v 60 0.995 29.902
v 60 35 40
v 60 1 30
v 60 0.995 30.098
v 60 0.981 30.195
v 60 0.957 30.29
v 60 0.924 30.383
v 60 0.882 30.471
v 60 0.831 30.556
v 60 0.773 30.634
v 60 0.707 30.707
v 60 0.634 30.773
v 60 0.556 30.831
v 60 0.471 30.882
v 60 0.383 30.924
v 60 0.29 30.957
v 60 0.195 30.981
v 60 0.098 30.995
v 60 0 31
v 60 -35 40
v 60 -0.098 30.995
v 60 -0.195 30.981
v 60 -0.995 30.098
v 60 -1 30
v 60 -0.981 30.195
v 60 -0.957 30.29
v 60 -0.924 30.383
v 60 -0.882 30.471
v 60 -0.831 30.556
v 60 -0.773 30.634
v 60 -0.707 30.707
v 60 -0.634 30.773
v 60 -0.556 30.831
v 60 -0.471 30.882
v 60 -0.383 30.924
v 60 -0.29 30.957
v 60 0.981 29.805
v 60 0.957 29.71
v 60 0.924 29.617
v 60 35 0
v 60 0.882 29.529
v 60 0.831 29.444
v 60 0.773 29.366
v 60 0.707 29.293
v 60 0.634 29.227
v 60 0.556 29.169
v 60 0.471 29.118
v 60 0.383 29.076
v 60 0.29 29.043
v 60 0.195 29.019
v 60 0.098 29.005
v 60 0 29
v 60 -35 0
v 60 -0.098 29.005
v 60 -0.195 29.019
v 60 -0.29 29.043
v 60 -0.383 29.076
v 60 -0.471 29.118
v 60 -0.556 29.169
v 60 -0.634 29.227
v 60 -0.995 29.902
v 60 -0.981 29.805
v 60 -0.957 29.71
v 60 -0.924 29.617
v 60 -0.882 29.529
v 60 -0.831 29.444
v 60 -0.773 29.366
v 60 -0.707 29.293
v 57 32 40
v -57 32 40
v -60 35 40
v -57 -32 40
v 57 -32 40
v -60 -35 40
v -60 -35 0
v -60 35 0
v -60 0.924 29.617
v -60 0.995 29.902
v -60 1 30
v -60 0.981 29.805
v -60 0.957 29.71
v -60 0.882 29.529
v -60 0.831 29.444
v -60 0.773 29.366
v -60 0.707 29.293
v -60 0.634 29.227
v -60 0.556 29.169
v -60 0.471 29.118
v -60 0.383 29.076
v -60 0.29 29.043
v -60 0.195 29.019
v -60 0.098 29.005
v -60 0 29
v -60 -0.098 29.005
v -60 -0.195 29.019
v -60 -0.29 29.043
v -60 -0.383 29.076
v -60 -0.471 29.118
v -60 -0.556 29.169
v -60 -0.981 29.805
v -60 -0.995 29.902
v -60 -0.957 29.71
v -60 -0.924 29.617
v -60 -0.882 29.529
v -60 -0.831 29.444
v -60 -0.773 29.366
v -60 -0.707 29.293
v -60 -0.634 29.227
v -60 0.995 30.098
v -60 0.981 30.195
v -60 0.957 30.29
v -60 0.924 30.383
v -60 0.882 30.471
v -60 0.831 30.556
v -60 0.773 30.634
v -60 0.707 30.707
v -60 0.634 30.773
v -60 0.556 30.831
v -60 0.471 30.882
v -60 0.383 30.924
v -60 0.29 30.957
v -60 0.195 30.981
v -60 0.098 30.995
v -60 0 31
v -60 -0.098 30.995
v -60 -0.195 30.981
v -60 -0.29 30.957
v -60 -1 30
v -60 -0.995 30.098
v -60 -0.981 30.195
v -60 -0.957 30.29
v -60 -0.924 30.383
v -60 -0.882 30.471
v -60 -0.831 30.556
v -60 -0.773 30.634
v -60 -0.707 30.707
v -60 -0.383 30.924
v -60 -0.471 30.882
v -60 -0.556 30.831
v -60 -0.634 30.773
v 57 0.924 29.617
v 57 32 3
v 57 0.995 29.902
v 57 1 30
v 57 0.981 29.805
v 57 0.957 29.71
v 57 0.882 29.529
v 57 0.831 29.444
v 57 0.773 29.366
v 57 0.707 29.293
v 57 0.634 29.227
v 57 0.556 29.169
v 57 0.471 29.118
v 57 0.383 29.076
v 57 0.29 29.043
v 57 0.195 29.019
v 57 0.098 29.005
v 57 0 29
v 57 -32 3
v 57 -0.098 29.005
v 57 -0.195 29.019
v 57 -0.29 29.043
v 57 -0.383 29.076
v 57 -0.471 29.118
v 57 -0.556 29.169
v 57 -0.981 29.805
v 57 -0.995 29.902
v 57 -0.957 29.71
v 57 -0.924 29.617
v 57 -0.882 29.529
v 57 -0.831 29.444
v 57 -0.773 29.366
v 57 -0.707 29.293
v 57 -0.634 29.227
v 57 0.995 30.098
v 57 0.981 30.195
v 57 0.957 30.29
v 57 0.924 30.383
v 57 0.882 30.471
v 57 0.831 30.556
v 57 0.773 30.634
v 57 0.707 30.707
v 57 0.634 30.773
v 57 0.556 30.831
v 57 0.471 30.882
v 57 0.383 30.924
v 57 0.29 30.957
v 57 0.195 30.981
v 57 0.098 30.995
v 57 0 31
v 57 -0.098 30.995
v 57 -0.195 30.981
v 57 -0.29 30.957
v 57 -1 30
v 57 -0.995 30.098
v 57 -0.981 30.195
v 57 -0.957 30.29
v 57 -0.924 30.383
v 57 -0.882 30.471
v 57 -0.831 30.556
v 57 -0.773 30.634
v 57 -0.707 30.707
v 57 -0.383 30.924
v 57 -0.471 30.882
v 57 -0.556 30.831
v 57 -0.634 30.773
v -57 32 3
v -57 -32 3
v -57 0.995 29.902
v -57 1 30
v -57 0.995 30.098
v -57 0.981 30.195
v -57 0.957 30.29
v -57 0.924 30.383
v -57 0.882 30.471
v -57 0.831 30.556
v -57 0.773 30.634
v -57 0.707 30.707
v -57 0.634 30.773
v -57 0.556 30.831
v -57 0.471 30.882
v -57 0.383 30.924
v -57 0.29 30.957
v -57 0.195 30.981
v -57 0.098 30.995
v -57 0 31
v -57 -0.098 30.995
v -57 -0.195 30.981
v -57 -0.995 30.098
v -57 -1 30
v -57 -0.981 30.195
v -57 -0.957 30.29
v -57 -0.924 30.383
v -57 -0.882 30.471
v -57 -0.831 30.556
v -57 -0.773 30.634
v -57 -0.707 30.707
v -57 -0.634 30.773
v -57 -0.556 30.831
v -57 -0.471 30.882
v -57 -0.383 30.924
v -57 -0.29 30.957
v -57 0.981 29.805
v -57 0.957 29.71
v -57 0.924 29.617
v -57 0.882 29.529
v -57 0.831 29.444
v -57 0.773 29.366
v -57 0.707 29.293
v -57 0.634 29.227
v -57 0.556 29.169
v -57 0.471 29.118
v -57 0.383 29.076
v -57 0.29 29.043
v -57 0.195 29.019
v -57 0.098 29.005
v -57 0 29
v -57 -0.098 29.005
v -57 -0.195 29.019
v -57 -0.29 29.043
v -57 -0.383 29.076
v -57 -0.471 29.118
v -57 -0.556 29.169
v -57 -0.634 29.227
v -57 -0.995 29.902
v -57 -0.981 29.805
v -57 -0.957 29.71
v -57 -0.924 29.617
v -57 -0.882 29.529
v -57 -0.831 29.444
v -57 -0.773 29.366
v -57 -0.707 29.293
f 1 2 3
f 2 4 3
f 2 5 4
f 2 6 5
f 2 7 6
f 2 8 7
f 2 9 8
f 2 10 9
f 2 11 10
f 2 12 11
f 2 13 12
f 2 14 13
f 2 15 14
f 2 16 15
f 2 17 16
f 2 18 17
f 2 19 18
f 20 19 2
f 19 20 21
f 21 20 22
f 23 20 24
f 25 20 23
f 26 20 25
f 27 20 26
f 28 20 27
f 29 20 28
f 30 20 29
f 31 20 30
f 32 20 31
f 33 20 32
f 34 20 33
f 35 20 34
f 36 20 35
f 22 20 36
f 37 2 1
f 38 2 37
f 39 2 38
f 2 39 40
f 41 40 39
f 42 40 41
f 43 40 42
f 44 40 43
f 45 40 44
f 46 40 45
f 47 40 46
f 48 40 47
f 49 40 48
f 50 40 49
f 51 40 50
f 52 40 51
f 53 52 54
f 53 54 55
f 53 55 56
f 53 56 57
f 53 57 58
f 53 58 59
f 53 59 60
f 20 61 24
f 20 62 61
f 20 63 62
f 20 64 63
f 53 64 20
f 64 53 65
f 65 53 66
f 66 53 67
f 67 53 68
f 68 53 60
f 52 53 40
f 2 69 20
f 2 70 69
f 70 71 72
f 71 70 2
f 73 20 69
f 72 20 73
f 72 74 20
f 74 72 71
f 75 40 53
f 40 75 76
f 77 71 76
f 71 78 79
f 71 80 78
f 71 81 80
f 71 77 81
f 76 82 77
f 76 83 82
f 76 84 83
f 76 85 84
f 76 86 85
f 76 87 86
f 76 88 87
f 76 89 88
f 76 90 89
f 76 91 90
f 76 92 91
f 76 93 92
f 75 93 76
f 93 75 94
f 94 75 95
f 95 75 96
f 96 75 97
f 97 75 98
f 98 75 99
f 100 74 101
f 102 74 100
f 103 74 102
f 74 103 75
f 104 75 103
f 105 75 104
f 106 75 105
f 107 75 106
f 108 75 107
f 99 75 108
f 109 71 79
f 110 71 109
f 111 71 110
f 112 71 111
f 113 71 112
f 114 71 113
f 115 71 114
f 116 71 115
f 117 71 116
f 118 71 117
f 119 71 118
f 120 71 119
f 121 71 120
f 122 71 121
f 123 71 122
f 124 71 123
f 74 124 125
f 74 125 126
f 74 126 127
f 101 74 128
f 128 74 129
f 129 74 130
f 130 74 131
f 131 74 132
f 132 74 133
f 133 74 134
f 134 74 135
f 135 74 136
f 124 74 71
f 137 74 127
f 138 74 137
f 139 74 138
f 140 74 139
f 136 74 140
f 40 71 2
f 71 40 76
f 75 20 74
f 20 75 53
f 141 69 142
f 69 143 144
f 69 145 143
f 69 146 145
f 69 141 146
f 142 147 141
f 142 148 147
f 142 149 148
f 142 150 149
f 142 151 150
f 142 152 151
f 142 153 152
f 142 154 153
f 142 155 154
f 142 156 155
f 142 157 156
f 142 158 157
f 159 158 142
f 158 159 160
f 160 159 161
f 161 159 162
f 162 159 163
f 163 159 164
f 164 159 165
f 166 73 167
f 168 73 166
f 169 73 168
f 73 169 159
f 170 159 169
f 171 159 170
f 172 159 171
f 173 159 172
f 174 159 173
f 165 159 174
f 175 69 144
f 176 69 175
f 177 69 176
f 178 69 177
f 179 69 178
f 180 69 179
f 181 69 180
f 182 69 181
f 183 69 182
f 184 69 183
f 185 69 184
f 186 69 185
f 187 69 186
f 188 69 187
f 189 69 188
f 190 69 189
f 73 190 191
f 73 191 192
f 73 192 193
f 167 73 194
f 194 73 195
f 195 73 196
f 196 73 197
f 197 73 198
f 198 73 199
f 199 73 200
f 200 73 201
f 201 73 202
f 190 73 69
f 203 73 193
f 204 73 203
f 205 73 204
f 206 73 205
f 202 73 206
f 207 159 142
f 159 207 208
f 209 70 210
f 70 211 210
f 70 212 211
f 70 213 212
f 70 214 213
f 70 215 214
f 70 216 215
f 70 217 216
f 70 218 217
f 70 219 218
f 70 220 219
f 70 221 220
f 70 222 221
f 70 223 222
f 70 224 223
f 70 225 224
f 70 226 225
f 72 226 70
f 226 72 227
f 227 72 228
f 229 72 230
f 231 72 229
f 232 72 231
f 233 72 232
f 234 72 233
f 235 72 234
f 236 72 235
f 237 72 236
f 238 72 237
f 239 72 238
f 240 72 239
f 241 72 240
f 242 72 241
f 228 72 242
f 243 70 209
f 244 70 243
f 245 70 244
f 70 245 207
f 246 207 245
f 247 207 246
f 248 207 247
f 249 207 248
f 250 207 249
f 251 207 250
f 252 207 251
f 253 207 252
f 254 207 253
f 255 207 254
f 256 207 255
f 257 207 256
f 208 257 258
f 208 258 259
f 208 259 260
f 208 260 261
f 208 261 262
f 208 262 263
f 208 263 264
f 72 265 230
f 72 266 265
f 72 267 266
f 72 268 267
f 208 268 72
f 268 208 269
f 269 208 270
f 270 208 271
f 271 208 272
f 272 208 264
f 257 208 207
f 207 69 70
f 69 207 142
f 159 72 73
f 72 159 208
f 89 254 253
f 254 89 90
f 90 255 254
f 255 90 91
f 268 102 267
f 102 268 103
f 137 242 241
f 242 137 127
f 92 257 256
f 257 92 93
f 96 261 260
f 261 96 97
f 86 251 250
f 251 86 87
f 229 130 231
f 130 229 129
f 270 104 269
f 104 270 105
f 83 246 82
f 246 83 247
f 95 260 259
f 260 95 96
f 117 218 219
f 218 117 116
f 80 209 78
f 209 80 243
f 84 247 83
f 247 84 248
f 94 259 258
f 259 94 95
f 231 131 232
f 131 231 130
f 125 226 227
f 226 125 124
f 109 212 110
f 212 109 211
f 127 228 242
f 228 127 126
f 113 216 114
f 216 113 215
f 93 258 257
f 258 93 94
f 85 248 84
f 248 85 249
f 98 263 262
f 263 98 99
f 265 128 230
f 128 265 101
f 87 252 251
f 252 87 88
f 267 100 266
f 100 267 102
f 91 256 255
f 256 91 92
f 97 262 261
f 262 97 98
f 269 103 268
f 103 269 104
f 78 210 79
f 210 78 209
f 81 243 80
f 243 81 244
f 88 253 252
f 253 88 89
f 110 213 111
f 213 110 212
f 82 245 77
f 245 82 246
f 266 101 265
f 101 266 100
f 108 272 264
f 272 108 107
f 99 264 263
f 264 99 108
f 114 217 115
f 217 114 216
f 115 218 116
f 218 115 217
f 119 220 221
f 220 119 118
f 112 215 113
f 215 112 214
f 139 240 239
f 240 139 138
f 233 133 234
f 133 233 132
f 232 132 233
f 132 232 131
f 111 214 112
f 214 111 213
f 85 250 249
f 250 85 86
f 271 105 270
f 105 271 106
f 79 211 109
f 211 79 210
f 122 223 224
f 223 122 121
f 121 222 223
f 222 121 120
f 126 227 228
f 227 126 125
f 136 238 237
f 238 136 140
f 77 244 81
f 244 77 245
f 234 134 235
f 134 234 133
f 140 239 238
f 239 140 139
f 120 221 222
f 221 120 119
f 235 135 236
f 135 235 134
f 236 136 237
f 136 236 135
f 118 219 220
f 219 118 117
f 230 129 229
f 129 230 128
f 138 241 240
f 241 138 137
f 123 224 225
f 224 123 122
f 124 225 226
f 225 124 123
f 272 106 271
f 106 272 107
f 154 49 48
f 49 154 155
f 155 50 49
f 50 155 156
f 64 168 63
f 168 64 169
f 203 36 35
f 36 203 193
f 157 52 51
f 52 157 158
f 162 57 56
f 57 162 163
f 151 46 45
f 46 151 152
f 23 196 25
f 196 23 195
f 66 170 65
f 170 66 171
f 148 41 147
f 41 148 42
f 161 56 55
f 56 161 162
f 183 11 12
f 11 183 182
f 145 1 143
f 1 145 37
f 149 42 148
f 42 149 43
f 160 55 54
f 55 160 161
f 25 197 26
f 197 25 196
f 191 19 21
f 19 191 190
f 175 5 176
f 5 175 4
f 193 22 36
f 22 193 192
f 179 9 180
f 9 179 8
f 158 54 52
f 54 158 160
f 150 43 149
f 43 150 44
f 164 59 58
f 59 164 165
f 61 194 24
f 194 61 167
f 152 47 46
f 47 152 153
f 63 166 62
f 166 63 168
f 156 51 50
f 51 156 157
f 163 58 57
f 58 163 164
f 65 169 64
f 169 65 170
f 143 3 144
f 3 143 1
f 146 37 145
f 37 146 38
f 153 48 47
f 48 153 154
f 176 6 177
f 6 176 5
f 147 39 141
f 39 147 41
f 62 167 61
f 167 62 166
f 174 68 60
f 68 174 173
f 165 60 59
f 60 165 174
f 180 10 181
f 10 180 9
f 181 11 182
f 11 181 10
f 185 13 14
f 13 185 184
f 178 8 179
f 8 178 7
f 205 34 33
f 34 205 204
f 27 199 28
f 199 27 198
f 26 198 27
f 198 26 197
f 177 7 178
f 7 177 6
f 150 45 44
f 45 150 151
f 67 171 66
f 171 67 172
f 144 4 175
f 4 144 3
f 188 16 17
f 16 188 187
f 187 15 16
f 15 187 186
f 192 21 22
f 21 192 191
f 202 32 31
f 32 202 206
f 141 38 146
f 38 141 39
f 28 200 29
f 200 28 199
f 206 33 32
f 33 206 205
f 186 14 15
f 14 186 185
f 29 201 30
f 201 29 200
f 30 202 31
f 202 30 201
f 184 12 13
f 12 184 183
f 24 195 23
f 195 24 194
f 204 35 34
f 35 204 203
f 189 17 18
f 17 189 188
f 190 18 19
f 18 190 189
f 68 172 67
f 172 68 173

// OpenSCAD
// Buffer tank for mini horizontal gel-electrophoresis box
// Dimensions measured with calipers

// Outer dimensions
outer_x = 120;
outer_y = 70;
outer_z = 40;

// Wall and floor thickness
wall_thickness = 3;
floor_thickness = 3;

// Inner dimensions (derived)
inner_x = outer_x - 2 * wall_thickness;
inner_y = outer_y - 2 * wall_thickness;
inner_z = outer_z - floor_thickness;

// Gel tray platform dimensions
platform_x = 60;
platform_y = inner_y; // spans full inner width
platform_z = 10; // height above inner floor
platform_top_z = floor_thickness + platform_z; // absolute z position of top surface (13 mm)

// Electrode wire holes
hole_diameter = 2;
hole_y = 0;
hole_z = 30;

// Rendering quality
$fn = 64;

// Main tank body (outer shell minus inner cavity)
difference() {
    // Outer block
    translate([-outer_x/2, -outer_y/2, 0])
        cube([outer_x, outer_y, outer_z]);
    
    // Inner cavity (open top)
    // The cavity starts at floor_thickness and goes up to outer_z + 1 to ensure full cut
    translate([-inner_x/2, -inner_y/2, floor_thickness])
        cube([inner_x, inner_y, outer_z - floor_thickness + 1]);
    
    // Gel tray platform
    // The platform sits on the inner floor (z = floor_thickness) and rises by platform_z
    translate([-platform_x/2, -platform_y/2, floor_thickness])
        cube([platform_x, platform_y, platform_z]);
    
    // Electrode wire holes (left and right end walls)
    // Left end wall hole
    translate([-outer_x/2 + wall_thickness/2, hole_y, hole_z])
        rotate([0, 90, 0])
            cylinder(r = hole_diameter/2, h = wall_thickness + 0.1, center = true);
    
    // Right end wall hole
    translate([outer_x/2 - wall_thickness/2, hole_y, hole_z])
        rotate([0, 90, 0])
            cylinder(r = hole_diameter/2, h = wall_thickness + 0.1, center = true);
}
